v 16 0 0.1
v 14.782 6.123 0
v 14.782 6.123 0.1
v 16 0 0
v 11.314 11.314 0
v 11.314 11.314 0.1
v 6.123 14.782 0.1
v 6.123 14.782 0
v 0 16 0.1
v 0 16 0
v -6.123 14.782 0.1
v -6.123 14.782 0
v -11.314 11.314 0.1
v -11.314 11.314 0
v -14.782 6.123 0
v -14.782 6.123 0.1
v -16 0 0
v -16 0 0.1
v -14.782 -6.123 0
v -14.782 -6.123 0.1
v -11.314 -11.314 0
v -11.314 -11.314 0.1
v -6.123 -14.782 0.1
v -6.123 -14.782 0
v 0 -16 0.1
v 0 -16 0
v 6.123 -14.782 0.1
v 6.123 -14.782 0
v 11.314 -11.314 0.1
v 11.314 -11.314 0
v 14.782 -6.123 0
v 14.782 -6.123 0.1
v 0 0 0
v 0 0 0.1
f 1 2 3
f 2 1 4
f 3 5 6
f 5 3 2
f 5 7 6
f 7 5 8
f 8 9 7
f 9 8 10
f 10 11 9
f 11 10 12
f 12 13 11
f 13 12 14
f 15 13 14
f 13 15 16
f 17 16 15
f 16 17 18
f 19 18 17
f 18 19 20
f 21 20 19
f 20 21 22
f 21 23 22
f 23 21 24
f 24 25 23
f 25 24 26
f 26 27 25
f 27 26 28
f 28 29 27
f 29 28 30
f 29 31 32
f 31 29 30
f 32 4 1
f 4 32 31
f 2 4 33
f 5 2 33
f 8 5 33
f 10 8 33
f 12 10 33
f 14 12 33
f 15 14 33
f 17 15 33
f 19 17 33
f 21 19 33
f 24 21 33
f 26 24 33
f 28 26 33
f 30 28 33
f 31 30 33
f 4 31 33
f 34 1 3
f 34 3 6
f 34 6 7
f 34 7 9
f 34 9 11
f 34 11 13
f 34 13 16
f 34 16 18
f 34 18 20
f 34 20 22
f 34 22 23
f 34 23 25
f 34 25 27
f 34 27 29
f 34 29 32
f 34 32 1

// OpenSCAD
// file: ../p/4-4disc.scad
use <../lib.scad>
function ldraw_lib__4_4disc() = [
// 0 Disc 1.0
// 0 Name: 4-4disc.dat
// 0 Author: James Jessiman
// 0 !LDRAW_ORG Primitive UPDATE 2002-02
// 0 !LICENSE Licensed under CC BY 2.0 and CC BY 4.0 : see CAreadme.txt
// 
// 0 BFC CERTIFY CCW
  [0,"BFC","CERTIFY"],
  [0,"BFC","CCW"],
// 
// 0 !HISTORY 1998-12-15 [PTadmin] Official Update 1998-10
// 0 !HISTORY 2002-03-23 [sbliss] Added BFC statement
// 0 !HISTORY 2002-04-25 [PTadmin] Official Update 2002-02
// 0 !HISTORY 2007-06-24 [PTadmin] Header formatted for Contributor Agreement
// 0 !HISTORY 2008-07-01 [PTadmin] Official Update 2008-01
// 
// 
// 3 16 0 0 0 1 0 0 0.9239 0 0.3827
  [3,16,0,0,0,1,0,0,0.9239,0,0.3827],
// 3 16 0 0 0 0.9239 0 0.3827 0.7071 0 0.7071
  [3,16,0,0,0,0.9239,0,0.3827,0.7071,0,0.7071],
// 3 16 0 0 0 0.7071 0 0.7071 0.3827 0 0.9239
  [3,16,0,0,0,0.7071,0,0.7071,0.3827,0,0.9239],
// 3 16 0 0 0 0.3827 0 0.9239 0 0 1
  [3,16,0,0,0,0.3827,0,0.9239,0,0,1],
// 3 16 0 0 0 0 0 1 -0.3827 0 0.9239
  [3,16,0,0,0,0,0,1,-0.3827,0,0.9239],
// 3 16 0 0 0 -0.3827 0 0.9239 -0.7071 0 0.7071
  [3,16,0,0,0,-0.3827,0,0.9239,-0.7071,0,0.7071],
// 3 16 0 0 0 -0.7071 0 0.7071 -0.9239 0 0.3827
  [3,16,0,0,0,-0.7071,0,0.7071,-0.9239,0,0.3827],
// 3 16 0 0 0 -0.9239 0 0.3827 -1 0 -0
  [3,16,0,0,0,-0.9239,0,0.3827,-1,0,-0],
// 3 16 0 0 0 -1 0 -0 -0.9239 0 -0.3827
  [3,16,0,0,0,-1,0,-0,-0.9239,0,-0.3827],
// 3 16 0 0 0 -0.9239 0 -0.3827 -0.7071 0 -0.7071
  [3,16,0,0,0,-0.9239,0,-0.3827,-0.7071,0,-0.7071],
// 3 16 0 0 0 -0.7071 0 -0.7071 -0.3827 0 -0.9239
  [3,16,0,0,0,-0.7071,0,-0.7071,-0.3827,0,-0.9239],
// 3 16 0 0 0 -0.3827 0 -0.9239 0 0 -1
  [3,16,0,0,0,-0.3827,0,-0.9239,0,0,-1],
// 3 16 0 0 0 0 0 -1 0.3827 0 -0.9239
  [3,16,0,0,0,0,0,-1,0.3827,0,-0.9239],
// 3 16 0 0 0 0.3827 0 -0.9239 0.7071 0 -0.7071
  [3,16,0,0,0,0.3827,0,-0.9239,0.7071,0,-0.7071],
// 3 16 0 0 0 0.7071 0 -0.7071 0.9239 0 -0.3827
  [3,16,0,0,0,0.7071,0,-0.7071,0.9239,0,-0.3827],
// 3 16 0 0 0 0.9239 0 -0.3827 1 0 0
  [3,16,0,0,0,0.9239,0,-0.3827,1,0,0],
// 0
];
makepoly(ldraw_lib__4_4disc(), line=0.2);
// file: ../p/4-4cyli.scad
use <../lib.scad>
function ldraw_lib__4_4cyli() = [
// 0 Cylinder 1.0
// 0 Name: 4-4cyli.dat
// 0 Author: James Jessiman
// 0 !LDRAW_ORG Primitive UPDATE 2005-01
// 0 !LICENSE Licensed under CC BY 2.0 and CC BY 4.0 : see CAreadme.txt
// 
// 0 BFC CERTIFY CCW
  [0,"BFC","CERTIFY"],
  [0,"BFC","CCW"],
// 
// 0 !HISTORY 1998-12-15 [PTadmin] Official Update 1998-10
// 0 !HISTORY 2002-03-23 [sbliss] Added BFC statement; merged headers from files in distributions LDraw 0.27 and Complete.
// 0 !HISTORY 2002-04-25 [PTadmin] Official Update 2002-02
// 0 !HISTORY 2004-12-14 [guyvivan] BFC CCW
// 0 !HISTORY 2005-12-28 [PTadmin] Official Update 2005-01
// 0 !HISTORY 2007-06-24 [PTadmin] Header formatted for Contributor Agreement
// 0 !HISTORY 2008-07-01 [PTadmin] Official Update 2008-01
// 
// 
// 4 16 1 1 0 0.9239 1 0.3827 0.9239 0 0.3827 1 0 0
  [4,16,1,1,0,0.9239,1,0.3827,0.9239,0,0.3827,1,0,0],
// 5 24 1 0 0 1 1 0 0.9239 0 0.3827 0.9239 0 -0.3827
  [5,24,1,0,0,1,1,0,0.9239,0,0.3827,0.9239,0,-0.3827],
// 4 16 0.9239 1 0.3827 0.7071 1 0.7071 0.7071 0 0.7071 0.9239 0 0.3827
  [4,16,0.9239,1,0.3827,0.7071,1,0.7071,0.7071,0,0.7071,0.9239,0,0.3827],
// 5 24 0.9239 0 0.3827 0.9239 1 0.3827 0.7071 0 0.7071 1 0 0
  [5,24,0.9239,0,0.3827,0.9239,1,0.3827,0.7071,0,0.7071,1,0,0],
// 4 16 0.7071 1 0.7071 0.3827 1 0.9239 0.3827 0 0.9239 0.7071 0 0.7071
  [4,16,0.7071,1,0.7071,0.3827,1,0.9239,0.3827,0,0.9239,0.7071,0,0.7071],
// 5 24 0.7071 0 0.7071 0.7071 1 0.7071 0.3827 0 0.9239 0.9239 0 0.3827
  [5,24,0.7071,0,0.7071,0.7071,1,0.7071,0.3827,0,0.9239,0.9239,0,0.3827],
// 4 16 0.3827 1 0.9239 0 1 1 0 0 1 0.3827 0 0.9239
  [4,16,0.3827,1,0.9239,0,1,1,0,0,1,0.3827,0,0.9239],
// 5 24 0.3827 0 0.9239 0.3827 1 0.9239 0 0 1 0.7071 0 0.7071
  [5,24,0.3827,0,0.9239,0.3827,1,0.9239,0,0,1,0.7071,0,0.7071],
// 4 16 0 1 1 -0.3827 1 0.9239 -0.3827 0 0.9239 0 0 1
  [4,16,0,1,1,-0.3827,1,0.9239,-0.3827,0,0.9239,0,0,1],
// 5 24 0 0 1 0 1 1 -0.3827 0 0.9239 0.3827 0 0.9239
  [5,24,0,0,1,0,1,1,-0.3827,0,0.9239,0.3827,0,0.9239],
// 4 16 -0.3827 1 0.9239 -0.7071 1 0.7071 -0.7071 0 0.7071 -0.3827 0 0.9239
  [4,16,-0.3827,1,0.9239,-0.7071,1,0.7071,-0.7071,0,0.7071,-0.3827,0,0.9239],
// 5 24 -0.3827 0 0.9239 -0.3827 1 0.9239 -0.7071 0 0.7071 0 0 1
  [5,24,-0.3827,0,0.9239,-0.3827,1,0.9239,-0.7071,0,0.7071,0,0,1],
// 4 16 -0.7071 1 0.7071 -0.9239 1 0.3827 -0.9239 0 0.3827 -0.7071 0 0.7071
  [4,16,-0.7071,1,0.7071,-0.9239,1,0.3827,-0.9239,0,0.3827,-0.7071,0,0.7071],
// 5 24 -0.7071 0 0.7071 -0.7071 1 0.7071 -0.9239 0 0.3827 -0.3827 0 0.9239
  [5,24,-0.7071,0,0.7071,-0.7071,1,0.7071,-0.9239,0,0.3827,-0.3827,0,0.9239],
// 4 16 -0.9239 1 0.3827 -1 1 0 -1 0 0 -0.9239 0 0.3827
  [4,16,-0.9239,1,0.3827,-1,1,0,-1,0,0,-0.9239,0,0.3827],
// 5 24 -0.9239 0 0.3827 -0.9239 1 0.3827 -1 0 0 -0.7071 0 0.7071
  [5,24,-0.9239,0,0.3827,-0.9239,1,0.3827,-1,0,0,-0.7071,0,0.7071],
// 4 16 -1 1 0 -0.9239 1 -0.3827 -0.9239 0 -0.3827 -1 0 0
  [4,16,-1,1,0,-0.9239,1,-0.3827,-0.9239,0,-0.3827,-1,0,0],
// 5 24 -1 0 0 -1 1 0 -0.9239 0 -0.3827 -0.9239 0 0.3827
  [5,24,-1,0,0,-1,1,0,-0.9239,0,-0.3827,-0.9239,0,0.3827],
// 4 16 -0.9239 1 -0.3827 -0.7071 1 -0.7071 -0.7071 0 -0.7071 -0.9239 0 -0.3827
  [4,16,-0.9239,1,-0.3827,-0.7071,1,-0.7071,-0.7071,0,-0.7071,-0.9239,0,-0.3827],
// 5 24 -0.9239 0 -0.3827 -0.9239 1 -0.3827 -0.7071 0 -0.7071 -1 0 0
  [5,24,-0.9239,0,-0.3827,-0.9239,1,-0.3827,-0.7071,0,-0.7071,-1,0,0],
// 4 16 -0.7071 1 -0.7071 -0.3827 1 -0.9239 -0.3827 0 -0.9239 -0.7071 0 -0.7071
  [4,16,-0.7071,1,-0.7071,-0.3827,1,-0.9239,-0.3827,0,-0.9239,-0.7071,0,-0.7071],
// 5 24 -0.7071 0 -0.7071 -0.7071 1 -0.7071 -0.3827 0 -0.9239 -0.9239 0 -0.3827
  [5,24,-0.7071,0,-0.7071,-0.7071,1,-0.7071,-0.3827,0,-0.9239,-0.9239,0,-0.3827],
// 4 16 -0.3827 1 -0.9239 0 1 -1 0 0 -1 -0.3827 0 -0.9239
  [4,16,-0.3827,1,-0.9239,0,1,-1,0,0,-1,-0.3827,0,-0.9239],
// 5 24 -0.3827 0 -0.9239 -0.3827 1 -0.9239 0 0 -1 -0.7071 0 -0.7071
  [5,24,-0.3827,0,-0.9239,-0.3827,1,-0.9239,0,0,-1,-0.7071,0,-0.7071],
// 4 16 0 1 -1 0.3827 1 -0.9239 0.3827 0 -0.9239 0 0 -1
  [4,16,0,1,-1,0.3827,1,-0.9239,0.3827,0,-0.9239,0,0,-1],
// 5 24 0 0 -1 0 1 -1 0.3827 0 -0.9239 -0.3827 0 -0.9239
  [5,24,0,0,-1,0,1,-1,0.3827,0,-0.9239,-0.3827,0,-0.9239],
// 4 16 0.3827 1 -0.9239 0.7071 1 -0.7071 0.7071 0 -0.7071 0.3827 0 -0.9239
  [4,16,0.3827,1,-0.9239,0.7071,1,-0.7071,0.7071,0,-0.7071,0.3827,0,-0.9239],
// 5 24 0.3827 0 -0.9239 0.3827 1 -0.9239 0.7071 0 -0.7071 0 0 -1
  [5,24,0.3827,0,-0.9239,0.3827,1,-0.9239,0.7071,0,-0.7071,0,0,-1],
// 4 16 0.7071 1 -0.7071 0.9239 1 -0.3827 0.9239 0 -0.3827 0.7071 0 -0.7071
  [4,16,0.7071,1,-0.7071,0.9239,1,-0.3827,0.9239,0,-0.3827,0.7071,0,-0.7071],
// 5 24 0.7071 0 -0.7071 0.7071 1 -0.7071 0.9239 0 -0.3827 0.3827 0 -0.9239
  [5,24,0.7071,0,-0.7071,0.7071,1,-0.7071,0.9239,0,-0.3827,0.3827,0,-0.9239],
// 4 16 0.9239 1 -0.3827 1 1 0 1 0 0 0.9239 0 -0.3827
  [4,16,0.9239,1,-0.3827,1,1,0,1,0,0,0.9239,0,-0.3827],
// 5 24 0.9239 0 -0.3827 0.9239 1 -0.3827 1 0 0 0.7071 0 -0.7071
  [5,24,0.9239,0,-0.3827,0.9239,1,-0.3827,1,0,0,0.7071,0,-0.7071],
// 0
];
makepoly(ldraw_lib__4_4cyli(), line=0.2);
// main file
use <../lib.scad>
use <../p/4-4cyli.scad>
use <../p/4-4disc.scad>
function ldraw_lib__6015425a() = [
// 0 Sticker  4.0 x  4.0 Round with Orange Disc
// 0 Name: 6015425a.dat
// 0 Author: Joao Almeida [TullariS]
// 0 !LDRAW_ORG Part UPDATE 2017-01
// 0 !LICENSE Licensed under CC BY 2.0 and CC BY 4.0 : see CAreadme.txt
// 
// 0 BFC CERTIFY CCW
  [0,"BFC","CERTIFY"],
  [0,"BFC","CCW"],
// 
// 0 !KEYWORDS B-Wing, Set 10227, Star Wars
// 
// 0 !HISTORY 2016-05-03 [TullariS] Creation
// 0 !HISTORY 2016-12-30 [MMR1988] Made it 3D
// 0 !HISTORY 2017-12-30 [PTadmin] Official Update 2017-01
// 
// 
// 1 16 0 0 0 40 0 0 0 -0.25 0 0 0 40 4-4cyli.dat
  [1,16,0,0,0,40,0,0,0,-0.25,0,0,0,40, ldraw_lib__4_4cyli()],
// 1 16 0 0 0 40 0 0 0 -1 0 0 0 40 4-4disc.dat
  [1,16,0,0,0,40,0,0,0,-1,0,0,0,40, ldraw_lib__4_4disc()],
// 1 25 0 -0.25 0 40 0 0 0 1 0 0 0 40 4-4disc.dat
  [1,25,0,-0.25,0,40,0,0,0,1,0,0,0,40, ldraw_lib__4_4disc()],
];
makepoly(ldraw_lib__6015425a(), line=0.2);
